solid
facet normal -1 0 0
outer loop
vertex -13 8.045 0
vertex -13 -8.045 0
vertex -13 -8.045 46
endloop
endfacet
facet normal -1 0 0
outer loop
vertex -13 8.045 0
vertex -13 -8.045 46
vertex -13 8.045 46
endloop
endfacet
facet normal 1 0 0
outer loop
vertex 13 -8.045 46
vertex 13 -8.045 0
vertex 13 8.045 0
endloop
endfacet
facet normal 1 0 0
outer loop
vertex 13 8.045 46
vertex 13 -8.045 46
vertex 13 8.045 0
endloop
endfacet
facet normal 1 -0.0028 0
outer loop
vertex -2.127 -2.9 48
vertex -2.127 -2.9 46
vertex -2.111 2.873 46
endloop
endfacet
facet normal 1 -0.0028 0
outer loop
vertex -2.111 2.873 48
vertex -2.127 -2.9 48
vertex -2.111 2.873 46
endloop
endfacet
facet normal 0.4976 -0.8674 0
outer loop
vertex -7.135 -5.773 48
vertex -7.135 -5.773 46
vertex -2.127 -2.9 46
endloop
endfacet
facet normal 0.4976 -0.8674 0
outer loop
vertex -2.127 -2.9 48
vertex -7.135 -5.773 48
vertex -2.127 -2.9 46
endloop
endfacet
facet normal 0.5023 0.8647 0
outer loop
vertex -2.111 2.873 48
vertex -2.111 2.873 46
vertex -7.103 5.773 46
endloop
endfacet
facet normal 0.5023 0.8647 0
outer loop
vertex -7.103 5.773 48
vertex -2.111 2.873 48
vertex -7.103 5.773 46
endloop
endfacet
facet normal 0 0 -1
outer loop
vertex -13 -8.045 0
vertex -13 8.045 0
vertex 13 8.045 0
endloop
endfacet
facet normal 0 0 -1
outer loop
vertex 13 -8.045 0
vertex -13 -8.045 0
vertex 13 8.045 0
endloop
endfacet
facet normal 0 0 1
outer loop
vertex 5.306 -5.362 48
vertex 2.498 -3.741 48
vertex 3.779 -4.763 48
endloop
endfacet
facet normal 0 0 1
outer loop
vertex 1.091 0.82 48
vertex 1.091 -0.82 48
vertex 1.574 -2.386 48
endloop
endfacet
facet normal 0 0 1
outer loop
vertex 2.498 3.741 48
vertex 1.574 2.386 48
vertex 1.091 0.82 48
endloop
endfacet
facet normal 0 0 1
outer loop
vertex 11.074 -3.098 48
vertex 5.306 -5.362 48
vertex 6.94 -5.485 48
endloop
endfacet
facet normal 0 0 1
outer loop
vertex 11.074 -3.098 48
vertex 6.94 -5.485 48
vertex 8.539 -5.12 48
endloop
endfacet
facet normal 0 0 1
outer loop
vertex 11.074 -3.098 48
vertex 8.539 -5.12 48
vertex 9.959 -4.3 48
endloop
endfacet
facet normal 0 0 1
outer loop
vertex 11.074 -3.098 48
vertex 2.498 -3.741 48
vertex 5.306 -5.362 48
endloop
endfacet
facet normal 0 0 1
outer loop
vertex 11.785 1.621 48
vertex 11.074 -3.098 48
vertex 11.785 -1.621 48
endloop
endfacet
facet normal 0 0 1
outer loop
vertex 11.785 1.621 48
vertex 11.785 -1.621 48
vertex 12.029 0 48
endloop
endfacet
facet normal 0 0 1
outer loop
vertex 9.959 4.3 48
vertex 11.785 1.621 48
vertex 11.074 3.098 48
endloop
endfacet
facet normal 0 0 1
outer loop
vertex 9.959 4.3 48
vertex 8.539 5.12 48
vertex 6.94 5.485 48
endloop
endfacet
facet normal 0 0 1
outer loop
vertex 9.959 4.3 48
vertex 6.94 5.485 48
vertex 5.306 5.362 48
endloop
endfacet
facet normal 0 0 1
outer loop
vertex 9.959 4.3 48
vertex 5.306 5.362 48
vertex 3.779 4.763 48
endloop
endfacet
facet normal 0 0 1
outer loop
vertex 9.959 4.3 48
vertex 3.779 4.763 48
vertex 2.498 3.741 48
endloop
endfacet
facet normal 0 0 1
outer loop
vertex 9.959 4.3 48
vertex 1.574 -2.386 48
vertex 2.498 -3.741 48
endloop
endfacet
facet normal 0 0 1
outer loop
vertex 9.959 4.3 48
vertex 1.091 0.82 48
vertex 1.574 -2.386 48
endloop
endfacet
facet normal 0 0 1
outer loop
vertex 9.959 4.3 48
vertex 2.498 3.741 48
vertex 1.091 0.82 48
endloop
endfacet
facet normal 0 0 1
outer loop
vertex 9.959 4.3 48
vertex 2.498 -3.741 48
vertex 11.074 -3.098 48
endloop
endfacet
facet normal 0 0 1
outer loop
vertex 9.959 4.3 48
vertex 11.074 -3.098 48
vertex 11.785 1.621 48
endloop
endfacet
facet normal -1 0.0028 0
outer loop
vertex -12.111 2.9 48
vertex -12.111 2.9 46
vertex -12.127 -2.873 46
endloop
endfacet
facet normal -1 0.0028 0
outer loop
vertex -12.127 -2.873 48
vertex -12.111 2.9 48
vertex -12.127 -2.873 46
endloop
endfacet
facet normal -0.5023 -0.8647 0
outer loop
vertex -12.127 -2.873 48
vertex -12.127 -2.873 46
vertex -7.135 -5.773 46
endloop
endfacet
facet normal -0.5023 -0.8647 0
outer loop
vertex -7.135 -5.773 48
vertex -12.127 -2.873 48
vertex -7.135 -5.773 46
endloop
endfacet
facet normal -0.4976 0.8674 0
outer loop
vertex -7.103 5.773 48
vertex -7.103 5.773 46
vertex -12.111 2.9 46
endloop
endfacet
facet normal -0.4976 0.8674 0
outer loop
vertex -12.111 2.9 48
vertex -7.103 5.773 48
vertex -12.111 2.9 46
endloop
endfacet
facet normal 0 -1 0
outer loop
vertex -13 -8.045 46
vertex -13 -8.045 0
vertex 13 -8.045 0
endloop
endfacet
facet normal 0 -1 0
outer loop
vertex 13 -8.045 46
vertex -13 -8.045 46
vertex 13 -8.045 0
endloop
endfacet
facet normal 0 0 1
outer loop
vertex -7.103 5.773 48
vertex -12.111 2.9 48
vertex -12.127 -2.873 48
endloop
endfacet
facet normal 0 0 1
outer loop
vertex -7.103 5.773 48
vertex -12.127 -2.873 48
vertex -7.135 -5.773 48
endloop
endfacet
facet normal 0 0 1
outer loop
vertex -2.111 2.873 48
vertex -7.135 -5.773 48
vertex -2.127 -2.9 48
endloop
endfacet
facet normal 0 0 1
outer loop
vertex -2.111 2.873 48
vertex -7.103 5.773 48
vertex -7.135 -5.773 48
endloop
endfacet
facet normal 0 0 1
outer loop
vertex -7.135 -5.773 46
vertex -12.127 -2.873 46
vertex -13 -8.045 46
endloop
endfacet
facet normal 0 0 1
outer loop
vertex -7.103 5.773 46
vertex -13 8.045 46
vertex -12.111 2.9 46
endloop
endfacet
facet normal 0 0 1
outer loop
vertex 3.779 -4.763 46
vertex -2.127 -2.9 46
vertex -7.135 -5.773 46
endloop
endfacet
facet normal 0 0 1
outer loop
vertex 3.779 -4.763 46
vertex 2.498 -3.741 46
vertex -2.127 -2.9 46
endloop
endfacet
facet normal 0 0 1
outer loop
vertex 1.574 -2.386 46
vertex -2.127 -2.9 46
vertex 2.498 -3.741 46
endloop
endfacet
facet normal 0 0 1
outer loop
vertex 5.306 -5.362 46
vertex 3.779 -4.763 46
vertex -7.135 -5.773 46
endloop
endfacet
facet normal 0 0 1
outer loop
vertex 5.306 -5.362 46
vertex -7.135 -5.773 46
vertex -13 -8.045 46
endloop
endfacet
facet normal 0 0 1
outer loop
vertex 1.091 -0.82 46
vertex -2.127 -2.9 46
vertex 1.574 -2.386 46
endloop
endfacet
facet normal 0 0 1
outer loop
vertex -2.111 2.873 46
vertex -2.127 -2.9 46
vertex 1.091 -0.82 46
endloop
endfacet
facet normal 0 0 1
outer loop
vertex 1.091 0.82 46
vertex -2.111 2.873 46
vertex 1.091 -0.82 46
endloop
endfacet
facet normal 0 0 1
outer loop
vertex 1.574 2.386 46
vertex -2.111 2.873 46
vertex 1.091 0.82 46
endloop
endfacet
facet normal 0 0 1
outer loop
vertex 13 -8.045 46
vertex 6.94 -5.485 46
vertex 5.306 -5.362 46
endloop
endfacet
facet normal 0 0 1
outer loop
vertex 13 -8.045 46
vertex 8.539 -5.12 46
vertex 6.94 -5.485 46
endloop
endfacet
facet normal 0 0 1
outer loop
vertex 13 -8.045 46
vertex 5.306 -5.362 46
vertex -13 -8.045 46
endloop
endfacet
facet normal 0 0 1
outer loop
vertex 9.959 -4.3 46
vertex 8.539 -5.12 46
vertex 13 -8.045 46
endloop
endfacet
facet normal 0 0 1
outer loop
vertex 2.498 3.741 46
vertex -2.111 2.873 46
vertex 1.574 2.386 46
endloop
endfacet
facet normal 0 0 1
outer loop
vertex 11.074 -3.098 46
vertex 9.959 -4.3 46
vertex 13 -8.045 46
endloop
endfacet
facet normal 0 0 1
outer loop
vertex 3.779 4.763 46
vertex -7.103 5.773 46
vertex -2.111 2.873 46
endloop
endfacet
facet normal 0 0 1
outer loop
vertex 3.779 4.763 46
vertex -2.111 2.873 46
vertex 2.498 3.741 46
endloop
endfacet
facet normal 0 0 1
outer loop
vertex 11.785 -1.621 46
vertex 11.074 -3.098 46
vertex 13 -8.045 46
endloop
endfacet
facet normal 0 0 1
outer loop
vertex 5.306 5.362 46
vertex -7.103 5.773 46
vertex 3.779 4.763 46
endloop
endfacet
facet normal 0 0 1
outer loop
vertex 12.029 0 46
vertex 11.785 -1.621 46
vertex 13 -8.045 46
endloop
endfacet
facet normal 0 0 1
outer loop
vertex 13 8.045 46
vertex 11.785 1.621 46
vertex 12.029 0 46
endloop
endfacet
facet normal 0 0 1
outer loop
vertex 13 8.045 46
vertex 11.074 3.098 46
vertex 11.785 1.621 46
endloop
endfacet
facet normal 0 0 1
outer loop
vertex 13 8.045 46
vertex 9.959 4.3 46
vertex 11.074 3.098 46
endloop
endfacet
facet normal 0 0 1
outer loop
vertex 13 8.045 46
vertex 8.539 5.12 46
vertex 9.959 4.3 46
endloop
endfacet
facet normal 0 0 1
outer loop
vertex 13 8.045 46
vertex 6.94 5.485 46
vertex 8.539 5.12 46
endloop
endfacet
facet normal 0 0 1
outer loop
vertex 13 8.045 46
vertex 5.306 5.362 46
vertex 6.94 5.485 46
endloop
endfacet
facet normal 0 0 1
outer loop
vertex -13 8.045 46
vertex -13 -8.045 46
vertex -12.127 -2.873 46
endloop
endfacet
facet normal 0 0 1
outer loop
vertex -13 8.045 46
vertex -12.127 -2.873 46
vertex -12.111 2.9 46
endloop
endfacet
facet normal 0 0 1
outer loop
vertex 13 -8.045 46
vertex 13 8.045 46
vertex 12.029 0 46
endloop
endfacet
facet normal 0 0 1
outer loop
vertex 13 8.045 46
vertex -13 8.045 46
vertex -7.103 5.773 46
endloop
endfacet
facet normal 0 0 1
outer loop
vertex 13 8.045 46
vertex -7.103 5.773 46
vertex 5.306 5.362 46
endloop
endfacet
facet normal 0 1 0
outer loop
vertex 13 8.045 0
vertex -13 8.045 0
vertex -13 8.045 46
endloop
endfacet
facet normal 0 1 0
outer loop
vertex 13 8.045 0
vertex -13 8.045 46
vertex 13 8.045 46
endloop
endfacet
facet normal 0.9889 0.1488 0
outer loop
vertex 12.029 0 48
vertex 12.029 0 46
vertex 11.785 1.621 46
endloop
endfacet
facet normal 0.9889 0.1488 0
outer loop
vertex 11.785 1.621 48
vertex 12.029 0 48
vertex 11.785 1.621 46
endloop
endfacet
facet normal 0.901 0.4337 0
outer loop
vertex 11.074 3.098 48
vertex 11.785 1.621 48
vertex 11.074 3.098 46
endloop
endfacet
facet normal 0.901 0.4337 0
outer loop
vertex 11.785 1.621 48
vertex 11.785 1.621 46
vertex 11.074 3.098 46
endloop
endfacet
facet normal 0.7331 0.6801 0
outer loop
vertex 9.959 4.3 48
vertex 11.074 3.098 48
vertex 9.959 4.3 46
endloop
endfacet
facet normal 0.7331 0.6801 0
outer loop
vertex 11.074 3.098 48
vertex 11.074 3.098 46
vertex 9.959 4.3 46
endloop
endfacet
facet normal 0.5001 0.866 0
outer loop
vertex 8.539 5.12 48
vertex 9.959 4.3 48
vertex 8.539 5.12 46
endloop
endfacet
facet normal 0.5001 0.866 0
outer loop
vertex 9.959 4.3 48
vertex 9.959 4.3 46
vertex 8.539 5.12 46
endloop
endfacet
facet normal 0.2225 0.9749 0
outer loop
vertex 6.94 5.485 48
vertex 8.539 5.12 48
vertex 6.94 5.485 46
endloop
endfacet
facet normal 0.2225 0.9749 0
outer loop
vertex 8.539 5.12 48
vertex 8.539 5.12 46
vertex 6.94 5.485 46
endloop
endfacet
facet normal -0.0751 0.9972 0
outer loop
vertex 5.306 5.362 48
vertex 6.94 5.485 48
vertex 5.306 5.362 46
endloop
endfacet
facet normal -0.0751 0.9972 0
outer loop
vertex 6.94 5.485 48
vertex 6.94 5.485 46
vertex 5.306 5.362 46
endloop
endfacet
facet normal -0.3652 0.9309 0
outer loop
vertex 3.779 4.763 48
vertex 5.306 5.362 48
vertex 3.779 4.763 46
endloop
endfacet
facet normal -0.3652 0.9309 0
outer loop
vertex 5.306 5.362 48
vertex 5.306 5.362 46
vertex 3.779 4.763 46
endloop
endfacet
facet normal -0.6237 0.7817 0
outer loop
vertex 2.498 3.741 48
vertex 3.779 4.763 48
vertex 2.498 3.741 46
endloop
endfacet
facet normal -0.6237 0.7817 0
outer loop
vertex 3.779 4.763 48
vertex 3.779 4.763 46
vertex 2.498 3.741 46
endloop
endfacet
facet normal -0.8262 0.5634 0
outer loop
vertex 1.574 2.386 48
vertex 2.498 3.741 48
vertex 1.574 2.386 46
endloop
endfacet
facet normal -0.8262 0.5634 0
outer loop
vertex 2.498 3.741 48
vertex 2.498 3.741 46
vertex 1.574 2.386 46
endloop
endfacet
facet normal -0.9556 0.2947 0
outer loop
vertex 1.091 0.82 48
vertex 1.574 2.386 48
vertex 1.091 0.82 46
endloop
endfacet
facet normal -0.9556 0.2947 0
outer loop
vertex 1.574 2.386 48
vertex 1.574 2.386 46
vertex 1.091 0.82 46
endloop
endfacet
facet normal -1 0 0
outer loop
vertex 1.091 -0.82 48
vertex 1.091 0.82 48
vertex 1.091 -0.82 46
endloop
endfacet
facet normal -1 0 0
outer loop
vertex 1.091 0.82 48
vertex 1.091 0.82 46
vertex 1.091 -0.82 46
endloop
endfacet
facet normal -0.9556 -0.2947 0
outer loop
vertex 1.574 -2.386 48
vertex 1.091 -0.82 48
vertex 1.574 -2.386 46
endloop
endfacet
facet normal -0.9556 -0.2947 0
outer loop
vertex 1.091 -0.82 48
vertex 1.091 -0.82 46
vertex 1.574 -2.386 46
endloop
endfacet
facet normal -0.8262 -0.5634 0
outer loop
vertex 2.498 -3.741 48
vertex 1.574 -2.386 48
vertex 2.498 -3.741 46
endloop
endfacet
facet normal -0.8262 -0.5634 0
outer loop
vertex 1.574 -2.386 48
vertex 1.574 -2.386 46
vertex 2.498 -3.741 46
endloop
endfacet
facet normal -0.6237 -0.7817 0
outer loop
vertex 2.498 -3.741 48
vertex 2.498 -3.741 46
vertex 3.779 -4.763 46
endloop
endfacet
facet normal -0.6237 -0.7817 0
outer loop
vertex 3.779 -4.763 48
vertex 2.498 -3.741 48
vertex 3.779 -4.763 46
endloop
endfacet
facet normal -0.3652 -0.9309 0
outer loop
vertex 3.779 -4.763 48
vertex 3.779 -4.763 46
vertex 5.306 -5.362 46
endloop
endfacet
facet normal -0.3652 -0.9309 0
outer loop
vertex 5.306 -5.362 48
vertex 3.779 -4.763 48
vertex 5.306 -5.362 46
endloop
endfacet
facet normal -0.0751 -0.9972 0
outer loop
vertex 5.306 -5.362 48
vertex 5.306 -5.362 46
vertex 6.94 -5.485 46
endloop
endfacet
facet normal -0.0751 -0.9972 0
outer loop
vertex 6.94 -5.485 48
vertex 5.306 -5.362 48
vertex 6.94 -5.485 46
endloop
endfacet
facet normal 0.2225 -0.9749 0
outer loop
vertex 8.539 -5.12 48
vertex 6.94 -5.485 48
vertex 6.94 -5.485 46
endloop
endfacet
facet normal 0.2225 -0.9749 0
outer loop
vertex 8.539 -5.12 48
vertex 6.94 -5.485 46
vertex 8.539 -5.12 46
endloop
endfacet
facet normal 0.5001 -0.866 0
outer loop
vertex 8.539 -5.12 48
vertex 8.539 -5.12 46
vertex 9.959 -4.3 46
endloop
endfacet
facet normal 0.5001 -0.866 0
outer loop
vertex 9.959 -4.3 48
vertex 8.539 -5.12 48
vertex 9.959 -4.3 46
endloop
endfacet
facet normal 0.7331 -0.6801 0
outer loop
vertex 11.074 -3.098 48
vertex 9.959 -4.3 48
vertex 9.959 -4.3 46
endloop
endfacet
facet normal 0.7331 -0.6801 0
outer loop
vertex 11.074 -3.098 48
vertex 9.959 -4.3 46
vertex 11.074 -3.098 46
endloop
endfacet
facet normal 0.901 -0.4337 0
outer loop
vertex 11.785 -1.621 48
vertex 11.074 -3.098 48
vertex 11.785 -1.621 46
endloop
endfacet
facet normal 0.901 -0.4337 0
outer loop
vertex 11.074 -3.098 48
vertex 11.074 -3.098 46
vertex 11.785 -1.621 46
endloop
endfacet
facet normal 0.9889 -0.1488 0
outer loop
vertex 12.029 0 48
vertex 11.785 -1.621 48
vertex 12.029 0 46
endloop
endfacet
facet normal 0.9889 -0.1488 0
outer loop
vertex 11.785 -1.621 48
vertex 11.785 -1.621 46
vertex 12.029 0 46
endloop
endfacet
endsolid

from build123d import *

# Parameters (mm, degrees)
SKETCH1_W           = 26
SKETCH1_H           = 16.09
BOSS_EXTRUDE1_DEPTH = 46
SKETCH2_R           = 5.5
BOSS_EXTRUDE2_DEPTH = 2


with BuildPart() as part:
    # Sketch1 → Boss-Extrude1 (new body)
    with BuildSketch(Plane.XY):
        Rectangle(SKETCH1_W, SKETCH1_H)
    extrude(amount=BOSS_EXTRUDE1_DEPTH)

    # Sketch2 → Boss-Extrude2 (add)
    with BuildSketch(Plane.XY.offset(46)):
        with Locations((6.529444473, 0)):
            Circle(SKETCH2_R)
        Polygon((-7.134758176, -5.773481444), (-2.126944774, -2.900305802), (-2.111281169, 2.873175642), (-7.103430965, 5.773481444), (-12.111244367, 2.900305802), (-12.126907972, -2.873175642), align=None)
    extrude(amount=BOSS_EXTRUDE2_DEPTH)


solid = part.part
